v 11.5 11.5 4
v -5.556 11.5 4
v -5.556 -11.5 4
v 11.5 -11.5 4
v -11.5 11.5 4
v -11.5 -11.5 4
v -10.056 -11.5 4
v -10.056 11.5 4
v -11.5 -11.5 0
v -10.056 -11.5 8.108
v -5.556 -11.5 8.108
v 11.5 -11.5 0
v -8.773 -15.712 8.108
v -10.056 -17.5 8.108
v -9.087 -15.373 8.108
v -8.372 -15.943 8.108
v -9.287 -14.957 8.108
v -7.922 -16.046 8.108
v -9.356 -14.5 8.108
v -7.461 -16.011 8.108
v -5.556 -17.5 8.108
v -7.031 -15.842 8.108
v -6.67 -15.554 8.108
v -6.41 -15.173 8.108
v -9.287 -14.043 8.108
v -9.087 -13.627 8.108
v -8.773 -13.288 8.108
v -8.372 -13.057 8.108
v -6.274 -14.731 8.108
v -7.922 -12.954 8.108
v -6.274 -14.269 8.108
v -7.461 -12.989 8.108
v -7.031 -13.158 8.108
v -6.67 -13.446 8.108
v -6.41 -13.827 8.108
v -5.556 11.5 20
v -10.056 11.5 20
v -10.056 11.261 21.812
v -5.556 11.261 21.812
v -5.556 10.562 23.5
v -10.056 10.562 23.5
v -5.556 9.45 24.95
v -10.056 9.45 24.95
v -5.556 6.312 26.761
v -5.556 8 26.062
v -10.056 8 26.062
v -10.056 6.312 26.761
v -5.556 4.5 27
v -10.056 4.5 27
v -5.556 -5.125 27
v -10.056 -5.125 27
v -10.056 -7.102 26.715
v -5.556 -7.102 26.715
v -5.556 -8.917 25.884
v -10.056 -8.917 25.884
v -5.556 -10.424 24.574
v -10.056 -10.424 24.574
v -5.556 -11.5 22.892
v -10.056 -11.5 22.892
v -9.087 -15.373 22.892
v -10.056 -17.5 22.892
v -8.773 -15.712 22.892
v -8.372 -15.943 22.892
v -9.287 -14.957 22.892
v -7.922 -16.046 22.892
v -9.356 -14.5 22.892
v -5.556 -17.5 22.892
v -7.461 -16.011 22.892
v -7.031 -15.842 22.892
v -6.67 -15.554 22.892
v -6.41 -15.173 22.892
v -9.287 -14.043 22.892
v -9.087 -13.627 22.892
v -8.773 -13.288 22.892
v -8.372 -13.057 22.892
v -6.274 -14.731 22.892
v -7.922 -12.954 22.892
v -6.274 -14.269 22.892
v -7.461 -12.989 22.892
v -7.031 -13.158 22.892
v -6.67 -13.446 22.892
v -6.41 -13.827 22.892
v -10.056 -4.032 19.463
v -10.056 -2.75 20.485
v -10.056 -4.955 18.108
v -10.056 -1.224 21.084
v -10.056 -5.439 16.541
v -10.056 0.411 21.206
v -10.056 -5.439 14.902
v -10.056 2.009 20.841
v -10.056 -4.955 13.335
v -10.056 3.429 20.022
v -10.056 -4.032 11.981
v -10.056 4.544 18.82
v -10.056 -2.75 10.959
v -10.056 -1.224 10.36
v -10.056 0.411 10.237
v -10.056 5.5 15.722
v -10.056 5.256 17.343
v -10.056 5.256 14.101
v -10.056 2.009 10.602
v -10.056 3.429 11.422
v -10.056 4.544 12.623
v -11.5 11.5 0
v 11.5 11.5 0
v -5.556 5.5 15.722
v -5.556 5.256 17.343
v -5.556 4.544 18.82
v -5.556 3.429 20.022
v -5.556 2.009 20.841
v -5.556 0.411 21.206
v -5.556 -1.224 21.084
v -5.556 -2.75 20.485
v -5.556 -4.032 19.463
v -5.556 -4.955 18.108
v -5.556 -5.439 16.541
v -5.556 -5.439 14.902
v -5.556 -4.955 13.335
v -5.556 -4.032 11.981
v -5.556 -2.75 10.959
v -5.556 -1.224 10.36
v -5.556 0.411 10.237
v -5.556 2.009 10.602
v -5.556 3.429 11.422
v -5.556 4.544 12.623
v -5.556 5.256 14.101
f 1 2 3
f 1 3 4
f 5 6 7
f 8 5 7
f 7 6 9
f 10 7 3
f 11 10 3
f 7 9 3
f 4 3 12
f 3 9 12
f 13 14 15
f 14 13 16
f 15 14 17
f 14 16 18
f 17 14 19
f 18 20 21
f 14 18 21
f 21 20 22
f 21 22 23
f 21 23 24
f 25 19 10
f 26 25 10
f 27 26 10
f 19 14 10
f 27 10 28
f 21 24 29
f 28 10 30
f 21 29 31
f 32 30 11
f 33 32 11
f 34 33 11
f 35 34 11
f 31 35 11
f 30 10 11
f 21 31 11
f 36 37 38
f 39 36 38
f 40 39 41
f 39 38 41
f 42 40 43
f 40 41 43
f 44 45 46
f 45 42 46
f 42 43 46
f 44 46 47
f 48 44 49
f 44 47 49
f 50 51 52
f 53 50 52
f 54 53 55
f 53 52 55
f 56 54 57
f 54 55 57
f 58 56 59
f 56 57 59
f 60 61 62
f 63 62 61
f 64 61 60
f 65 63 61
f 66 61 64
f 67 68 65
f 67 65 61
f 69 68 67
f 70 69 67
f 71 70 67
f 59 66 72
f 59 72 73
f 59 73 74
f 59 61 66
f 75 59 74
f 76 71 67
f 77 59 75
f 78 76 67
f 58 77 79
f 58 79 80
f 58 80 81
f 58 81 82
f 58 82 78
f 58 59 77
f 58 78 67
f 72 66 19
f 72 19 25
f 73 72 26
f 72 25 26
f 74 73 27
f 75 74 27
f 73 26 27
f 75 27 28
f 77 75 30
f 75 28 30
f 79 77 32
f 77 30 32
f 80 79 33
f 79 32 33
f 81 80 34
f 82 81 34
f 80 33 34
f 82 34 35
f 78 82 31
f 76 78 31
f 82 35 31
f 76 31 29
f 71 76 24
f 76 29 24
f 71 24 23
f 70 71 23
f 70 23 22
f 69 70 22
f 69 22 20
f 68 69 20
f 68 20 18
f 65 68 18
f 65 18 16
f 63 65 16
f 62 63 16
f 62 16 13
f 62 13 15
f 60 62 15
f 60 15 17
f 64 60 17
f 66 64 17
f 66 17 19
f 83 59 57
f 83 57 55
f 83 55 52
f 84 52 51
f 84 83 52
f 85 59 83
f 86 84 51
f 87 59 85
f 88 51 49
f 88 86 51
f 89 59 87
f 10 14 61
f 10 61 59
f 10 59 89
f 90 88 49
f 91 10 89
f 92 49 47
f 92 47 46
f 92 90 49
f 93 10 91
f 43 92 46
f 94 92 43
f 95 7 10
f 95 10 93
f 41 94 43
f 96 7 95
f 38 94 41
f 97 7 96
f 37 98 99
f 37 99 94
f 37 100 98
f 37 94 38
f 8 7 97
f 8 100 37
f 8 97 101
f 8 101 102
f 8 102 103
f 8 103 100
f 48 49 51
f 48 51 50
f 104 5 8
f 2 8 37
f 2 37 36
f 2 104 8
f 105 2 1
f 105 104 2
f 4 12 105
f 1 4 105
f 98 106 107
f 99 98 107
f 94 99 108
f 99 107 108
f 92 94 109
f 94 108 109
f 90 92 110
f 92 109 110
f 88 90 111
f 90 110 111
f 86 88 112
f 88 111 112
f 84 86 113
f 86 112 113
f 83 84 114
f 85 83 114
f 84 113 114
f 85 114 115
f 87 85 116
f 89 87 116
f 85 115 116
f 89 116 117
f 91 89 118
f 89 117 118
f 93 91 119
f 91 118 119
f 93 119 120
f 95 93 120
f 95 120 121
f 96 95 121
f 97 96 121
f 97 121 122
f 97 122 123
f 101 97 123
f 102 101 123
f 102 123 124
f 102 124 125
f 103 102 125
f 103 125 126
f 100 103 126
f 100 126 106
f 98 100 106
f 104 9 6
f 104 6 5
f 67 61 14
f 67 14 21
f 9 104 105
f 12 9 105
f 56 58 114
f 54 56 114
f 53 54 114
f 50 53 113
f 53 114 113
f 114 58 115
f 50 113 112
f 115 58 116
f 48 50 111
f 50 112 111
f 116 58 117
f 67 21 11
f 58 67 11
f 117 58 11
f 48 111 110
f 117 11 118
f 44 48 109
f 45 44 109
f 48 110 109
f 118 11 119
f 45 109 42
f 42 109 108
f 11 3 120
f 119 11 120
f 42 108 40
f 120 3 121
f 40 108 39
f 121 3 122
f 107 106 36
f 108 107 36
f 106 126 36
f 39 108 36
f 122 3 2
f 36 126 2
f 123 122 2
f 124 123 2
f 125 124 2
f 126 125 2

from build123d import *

# Parameters (mm, degrees)
F0_W         = 23
F0_H         = 23
F1_DEPTH     = 4
F2_W         = 4.5
F2_H         = 23
F3_DEPTH     = 23
F4_W         = 4.5
F4_H         = 14.783909363
F5_DEPTH     = 6
F7_D         = 11
F9_D         = 3.1
F10_T1_DEPTH = 39.5
F10_T3_DEPTH = 36.3734207923


# Not quite as in the source:
# - a fillet or chamfer that OpenCascade refuses, or shapes differently, is made with other operations: its cross-section is extruded or revolved along the edge and cut away or added


with BuildPart() as f1:
    # F0 (on Top) → F1 (new body)
    with BuildSketch(Plane.XY):
        Rectangle(F0_W, F0_H)
    extrude(amount=F1_DEPTH)

    # F2 (on face) → F3 (join)
    with BuildSketch(Plane.XY.offset(4)):
        with Locations((-7.8062060252, 0)):
            Rectangle(F2_W, F2_H)
    extrude(amount=F3_DEPTH)

    # F4 (on face) → F5 (join)
    with BuildSketch(Plane.XZ.offset(11.5)):
        with Locations((-7.8062060252, 15.5)):
            Rectangle(F4_W, F4_H)
    extrude(amount=F5_DEPTH)

    # F7 (through all)
    with Locations(Plane(origin=(-10.0562060252, 0, 0), x_dir=(0, -1, 0), z_dir=(-1, 0, 0))):
        with Locations((0, 15.7216731459)):
            Hole(F7_D / 2)

    # F9 (through all)
    with Locations(Plane.XY.offset(22.8919546815)):
        with Locations((-7.8062060252, -14.5)):
            Hole(F9_D / 2)

    # F10: fillet of radius 7 on 2 edges, made by hand

    # F10_s2 → F10_t1 (cut)
    with BuildSketch(Plane.YZ.offset(-27.5562060252)):
        with BuildLine():
            ThreePointArc((11.5, 20), (9.4497474683, 24.9497474683), (4.5, 27))
            Line((4.5, 27), (11.5, 27))
            Line((11.5, 27), (11.5, 20))
        make_face()
    extrude(amount=F10_T1_DEPTH, mode=Mode.SUBTRACT)

    # F10_s4 → F10_t3 (cut)
    with BuildSketch(Plane.YZ.offset(-25.9929164214)):
        with BuildLine():
            ThreePointArc((-5.1253158415, 27), (-8.9171700865, 25.8840327485), (-11.5, 22.8919546815))
            Line((-11.5, 22.8919546815), (-11.5, 27))
            Line((-11.5, 27), (-5.1253158415, 27))
        make_face()
    extrude(amount=F10_T3_DEPTH, mode=Mode.SUBTRACT)


solid = f1.part
